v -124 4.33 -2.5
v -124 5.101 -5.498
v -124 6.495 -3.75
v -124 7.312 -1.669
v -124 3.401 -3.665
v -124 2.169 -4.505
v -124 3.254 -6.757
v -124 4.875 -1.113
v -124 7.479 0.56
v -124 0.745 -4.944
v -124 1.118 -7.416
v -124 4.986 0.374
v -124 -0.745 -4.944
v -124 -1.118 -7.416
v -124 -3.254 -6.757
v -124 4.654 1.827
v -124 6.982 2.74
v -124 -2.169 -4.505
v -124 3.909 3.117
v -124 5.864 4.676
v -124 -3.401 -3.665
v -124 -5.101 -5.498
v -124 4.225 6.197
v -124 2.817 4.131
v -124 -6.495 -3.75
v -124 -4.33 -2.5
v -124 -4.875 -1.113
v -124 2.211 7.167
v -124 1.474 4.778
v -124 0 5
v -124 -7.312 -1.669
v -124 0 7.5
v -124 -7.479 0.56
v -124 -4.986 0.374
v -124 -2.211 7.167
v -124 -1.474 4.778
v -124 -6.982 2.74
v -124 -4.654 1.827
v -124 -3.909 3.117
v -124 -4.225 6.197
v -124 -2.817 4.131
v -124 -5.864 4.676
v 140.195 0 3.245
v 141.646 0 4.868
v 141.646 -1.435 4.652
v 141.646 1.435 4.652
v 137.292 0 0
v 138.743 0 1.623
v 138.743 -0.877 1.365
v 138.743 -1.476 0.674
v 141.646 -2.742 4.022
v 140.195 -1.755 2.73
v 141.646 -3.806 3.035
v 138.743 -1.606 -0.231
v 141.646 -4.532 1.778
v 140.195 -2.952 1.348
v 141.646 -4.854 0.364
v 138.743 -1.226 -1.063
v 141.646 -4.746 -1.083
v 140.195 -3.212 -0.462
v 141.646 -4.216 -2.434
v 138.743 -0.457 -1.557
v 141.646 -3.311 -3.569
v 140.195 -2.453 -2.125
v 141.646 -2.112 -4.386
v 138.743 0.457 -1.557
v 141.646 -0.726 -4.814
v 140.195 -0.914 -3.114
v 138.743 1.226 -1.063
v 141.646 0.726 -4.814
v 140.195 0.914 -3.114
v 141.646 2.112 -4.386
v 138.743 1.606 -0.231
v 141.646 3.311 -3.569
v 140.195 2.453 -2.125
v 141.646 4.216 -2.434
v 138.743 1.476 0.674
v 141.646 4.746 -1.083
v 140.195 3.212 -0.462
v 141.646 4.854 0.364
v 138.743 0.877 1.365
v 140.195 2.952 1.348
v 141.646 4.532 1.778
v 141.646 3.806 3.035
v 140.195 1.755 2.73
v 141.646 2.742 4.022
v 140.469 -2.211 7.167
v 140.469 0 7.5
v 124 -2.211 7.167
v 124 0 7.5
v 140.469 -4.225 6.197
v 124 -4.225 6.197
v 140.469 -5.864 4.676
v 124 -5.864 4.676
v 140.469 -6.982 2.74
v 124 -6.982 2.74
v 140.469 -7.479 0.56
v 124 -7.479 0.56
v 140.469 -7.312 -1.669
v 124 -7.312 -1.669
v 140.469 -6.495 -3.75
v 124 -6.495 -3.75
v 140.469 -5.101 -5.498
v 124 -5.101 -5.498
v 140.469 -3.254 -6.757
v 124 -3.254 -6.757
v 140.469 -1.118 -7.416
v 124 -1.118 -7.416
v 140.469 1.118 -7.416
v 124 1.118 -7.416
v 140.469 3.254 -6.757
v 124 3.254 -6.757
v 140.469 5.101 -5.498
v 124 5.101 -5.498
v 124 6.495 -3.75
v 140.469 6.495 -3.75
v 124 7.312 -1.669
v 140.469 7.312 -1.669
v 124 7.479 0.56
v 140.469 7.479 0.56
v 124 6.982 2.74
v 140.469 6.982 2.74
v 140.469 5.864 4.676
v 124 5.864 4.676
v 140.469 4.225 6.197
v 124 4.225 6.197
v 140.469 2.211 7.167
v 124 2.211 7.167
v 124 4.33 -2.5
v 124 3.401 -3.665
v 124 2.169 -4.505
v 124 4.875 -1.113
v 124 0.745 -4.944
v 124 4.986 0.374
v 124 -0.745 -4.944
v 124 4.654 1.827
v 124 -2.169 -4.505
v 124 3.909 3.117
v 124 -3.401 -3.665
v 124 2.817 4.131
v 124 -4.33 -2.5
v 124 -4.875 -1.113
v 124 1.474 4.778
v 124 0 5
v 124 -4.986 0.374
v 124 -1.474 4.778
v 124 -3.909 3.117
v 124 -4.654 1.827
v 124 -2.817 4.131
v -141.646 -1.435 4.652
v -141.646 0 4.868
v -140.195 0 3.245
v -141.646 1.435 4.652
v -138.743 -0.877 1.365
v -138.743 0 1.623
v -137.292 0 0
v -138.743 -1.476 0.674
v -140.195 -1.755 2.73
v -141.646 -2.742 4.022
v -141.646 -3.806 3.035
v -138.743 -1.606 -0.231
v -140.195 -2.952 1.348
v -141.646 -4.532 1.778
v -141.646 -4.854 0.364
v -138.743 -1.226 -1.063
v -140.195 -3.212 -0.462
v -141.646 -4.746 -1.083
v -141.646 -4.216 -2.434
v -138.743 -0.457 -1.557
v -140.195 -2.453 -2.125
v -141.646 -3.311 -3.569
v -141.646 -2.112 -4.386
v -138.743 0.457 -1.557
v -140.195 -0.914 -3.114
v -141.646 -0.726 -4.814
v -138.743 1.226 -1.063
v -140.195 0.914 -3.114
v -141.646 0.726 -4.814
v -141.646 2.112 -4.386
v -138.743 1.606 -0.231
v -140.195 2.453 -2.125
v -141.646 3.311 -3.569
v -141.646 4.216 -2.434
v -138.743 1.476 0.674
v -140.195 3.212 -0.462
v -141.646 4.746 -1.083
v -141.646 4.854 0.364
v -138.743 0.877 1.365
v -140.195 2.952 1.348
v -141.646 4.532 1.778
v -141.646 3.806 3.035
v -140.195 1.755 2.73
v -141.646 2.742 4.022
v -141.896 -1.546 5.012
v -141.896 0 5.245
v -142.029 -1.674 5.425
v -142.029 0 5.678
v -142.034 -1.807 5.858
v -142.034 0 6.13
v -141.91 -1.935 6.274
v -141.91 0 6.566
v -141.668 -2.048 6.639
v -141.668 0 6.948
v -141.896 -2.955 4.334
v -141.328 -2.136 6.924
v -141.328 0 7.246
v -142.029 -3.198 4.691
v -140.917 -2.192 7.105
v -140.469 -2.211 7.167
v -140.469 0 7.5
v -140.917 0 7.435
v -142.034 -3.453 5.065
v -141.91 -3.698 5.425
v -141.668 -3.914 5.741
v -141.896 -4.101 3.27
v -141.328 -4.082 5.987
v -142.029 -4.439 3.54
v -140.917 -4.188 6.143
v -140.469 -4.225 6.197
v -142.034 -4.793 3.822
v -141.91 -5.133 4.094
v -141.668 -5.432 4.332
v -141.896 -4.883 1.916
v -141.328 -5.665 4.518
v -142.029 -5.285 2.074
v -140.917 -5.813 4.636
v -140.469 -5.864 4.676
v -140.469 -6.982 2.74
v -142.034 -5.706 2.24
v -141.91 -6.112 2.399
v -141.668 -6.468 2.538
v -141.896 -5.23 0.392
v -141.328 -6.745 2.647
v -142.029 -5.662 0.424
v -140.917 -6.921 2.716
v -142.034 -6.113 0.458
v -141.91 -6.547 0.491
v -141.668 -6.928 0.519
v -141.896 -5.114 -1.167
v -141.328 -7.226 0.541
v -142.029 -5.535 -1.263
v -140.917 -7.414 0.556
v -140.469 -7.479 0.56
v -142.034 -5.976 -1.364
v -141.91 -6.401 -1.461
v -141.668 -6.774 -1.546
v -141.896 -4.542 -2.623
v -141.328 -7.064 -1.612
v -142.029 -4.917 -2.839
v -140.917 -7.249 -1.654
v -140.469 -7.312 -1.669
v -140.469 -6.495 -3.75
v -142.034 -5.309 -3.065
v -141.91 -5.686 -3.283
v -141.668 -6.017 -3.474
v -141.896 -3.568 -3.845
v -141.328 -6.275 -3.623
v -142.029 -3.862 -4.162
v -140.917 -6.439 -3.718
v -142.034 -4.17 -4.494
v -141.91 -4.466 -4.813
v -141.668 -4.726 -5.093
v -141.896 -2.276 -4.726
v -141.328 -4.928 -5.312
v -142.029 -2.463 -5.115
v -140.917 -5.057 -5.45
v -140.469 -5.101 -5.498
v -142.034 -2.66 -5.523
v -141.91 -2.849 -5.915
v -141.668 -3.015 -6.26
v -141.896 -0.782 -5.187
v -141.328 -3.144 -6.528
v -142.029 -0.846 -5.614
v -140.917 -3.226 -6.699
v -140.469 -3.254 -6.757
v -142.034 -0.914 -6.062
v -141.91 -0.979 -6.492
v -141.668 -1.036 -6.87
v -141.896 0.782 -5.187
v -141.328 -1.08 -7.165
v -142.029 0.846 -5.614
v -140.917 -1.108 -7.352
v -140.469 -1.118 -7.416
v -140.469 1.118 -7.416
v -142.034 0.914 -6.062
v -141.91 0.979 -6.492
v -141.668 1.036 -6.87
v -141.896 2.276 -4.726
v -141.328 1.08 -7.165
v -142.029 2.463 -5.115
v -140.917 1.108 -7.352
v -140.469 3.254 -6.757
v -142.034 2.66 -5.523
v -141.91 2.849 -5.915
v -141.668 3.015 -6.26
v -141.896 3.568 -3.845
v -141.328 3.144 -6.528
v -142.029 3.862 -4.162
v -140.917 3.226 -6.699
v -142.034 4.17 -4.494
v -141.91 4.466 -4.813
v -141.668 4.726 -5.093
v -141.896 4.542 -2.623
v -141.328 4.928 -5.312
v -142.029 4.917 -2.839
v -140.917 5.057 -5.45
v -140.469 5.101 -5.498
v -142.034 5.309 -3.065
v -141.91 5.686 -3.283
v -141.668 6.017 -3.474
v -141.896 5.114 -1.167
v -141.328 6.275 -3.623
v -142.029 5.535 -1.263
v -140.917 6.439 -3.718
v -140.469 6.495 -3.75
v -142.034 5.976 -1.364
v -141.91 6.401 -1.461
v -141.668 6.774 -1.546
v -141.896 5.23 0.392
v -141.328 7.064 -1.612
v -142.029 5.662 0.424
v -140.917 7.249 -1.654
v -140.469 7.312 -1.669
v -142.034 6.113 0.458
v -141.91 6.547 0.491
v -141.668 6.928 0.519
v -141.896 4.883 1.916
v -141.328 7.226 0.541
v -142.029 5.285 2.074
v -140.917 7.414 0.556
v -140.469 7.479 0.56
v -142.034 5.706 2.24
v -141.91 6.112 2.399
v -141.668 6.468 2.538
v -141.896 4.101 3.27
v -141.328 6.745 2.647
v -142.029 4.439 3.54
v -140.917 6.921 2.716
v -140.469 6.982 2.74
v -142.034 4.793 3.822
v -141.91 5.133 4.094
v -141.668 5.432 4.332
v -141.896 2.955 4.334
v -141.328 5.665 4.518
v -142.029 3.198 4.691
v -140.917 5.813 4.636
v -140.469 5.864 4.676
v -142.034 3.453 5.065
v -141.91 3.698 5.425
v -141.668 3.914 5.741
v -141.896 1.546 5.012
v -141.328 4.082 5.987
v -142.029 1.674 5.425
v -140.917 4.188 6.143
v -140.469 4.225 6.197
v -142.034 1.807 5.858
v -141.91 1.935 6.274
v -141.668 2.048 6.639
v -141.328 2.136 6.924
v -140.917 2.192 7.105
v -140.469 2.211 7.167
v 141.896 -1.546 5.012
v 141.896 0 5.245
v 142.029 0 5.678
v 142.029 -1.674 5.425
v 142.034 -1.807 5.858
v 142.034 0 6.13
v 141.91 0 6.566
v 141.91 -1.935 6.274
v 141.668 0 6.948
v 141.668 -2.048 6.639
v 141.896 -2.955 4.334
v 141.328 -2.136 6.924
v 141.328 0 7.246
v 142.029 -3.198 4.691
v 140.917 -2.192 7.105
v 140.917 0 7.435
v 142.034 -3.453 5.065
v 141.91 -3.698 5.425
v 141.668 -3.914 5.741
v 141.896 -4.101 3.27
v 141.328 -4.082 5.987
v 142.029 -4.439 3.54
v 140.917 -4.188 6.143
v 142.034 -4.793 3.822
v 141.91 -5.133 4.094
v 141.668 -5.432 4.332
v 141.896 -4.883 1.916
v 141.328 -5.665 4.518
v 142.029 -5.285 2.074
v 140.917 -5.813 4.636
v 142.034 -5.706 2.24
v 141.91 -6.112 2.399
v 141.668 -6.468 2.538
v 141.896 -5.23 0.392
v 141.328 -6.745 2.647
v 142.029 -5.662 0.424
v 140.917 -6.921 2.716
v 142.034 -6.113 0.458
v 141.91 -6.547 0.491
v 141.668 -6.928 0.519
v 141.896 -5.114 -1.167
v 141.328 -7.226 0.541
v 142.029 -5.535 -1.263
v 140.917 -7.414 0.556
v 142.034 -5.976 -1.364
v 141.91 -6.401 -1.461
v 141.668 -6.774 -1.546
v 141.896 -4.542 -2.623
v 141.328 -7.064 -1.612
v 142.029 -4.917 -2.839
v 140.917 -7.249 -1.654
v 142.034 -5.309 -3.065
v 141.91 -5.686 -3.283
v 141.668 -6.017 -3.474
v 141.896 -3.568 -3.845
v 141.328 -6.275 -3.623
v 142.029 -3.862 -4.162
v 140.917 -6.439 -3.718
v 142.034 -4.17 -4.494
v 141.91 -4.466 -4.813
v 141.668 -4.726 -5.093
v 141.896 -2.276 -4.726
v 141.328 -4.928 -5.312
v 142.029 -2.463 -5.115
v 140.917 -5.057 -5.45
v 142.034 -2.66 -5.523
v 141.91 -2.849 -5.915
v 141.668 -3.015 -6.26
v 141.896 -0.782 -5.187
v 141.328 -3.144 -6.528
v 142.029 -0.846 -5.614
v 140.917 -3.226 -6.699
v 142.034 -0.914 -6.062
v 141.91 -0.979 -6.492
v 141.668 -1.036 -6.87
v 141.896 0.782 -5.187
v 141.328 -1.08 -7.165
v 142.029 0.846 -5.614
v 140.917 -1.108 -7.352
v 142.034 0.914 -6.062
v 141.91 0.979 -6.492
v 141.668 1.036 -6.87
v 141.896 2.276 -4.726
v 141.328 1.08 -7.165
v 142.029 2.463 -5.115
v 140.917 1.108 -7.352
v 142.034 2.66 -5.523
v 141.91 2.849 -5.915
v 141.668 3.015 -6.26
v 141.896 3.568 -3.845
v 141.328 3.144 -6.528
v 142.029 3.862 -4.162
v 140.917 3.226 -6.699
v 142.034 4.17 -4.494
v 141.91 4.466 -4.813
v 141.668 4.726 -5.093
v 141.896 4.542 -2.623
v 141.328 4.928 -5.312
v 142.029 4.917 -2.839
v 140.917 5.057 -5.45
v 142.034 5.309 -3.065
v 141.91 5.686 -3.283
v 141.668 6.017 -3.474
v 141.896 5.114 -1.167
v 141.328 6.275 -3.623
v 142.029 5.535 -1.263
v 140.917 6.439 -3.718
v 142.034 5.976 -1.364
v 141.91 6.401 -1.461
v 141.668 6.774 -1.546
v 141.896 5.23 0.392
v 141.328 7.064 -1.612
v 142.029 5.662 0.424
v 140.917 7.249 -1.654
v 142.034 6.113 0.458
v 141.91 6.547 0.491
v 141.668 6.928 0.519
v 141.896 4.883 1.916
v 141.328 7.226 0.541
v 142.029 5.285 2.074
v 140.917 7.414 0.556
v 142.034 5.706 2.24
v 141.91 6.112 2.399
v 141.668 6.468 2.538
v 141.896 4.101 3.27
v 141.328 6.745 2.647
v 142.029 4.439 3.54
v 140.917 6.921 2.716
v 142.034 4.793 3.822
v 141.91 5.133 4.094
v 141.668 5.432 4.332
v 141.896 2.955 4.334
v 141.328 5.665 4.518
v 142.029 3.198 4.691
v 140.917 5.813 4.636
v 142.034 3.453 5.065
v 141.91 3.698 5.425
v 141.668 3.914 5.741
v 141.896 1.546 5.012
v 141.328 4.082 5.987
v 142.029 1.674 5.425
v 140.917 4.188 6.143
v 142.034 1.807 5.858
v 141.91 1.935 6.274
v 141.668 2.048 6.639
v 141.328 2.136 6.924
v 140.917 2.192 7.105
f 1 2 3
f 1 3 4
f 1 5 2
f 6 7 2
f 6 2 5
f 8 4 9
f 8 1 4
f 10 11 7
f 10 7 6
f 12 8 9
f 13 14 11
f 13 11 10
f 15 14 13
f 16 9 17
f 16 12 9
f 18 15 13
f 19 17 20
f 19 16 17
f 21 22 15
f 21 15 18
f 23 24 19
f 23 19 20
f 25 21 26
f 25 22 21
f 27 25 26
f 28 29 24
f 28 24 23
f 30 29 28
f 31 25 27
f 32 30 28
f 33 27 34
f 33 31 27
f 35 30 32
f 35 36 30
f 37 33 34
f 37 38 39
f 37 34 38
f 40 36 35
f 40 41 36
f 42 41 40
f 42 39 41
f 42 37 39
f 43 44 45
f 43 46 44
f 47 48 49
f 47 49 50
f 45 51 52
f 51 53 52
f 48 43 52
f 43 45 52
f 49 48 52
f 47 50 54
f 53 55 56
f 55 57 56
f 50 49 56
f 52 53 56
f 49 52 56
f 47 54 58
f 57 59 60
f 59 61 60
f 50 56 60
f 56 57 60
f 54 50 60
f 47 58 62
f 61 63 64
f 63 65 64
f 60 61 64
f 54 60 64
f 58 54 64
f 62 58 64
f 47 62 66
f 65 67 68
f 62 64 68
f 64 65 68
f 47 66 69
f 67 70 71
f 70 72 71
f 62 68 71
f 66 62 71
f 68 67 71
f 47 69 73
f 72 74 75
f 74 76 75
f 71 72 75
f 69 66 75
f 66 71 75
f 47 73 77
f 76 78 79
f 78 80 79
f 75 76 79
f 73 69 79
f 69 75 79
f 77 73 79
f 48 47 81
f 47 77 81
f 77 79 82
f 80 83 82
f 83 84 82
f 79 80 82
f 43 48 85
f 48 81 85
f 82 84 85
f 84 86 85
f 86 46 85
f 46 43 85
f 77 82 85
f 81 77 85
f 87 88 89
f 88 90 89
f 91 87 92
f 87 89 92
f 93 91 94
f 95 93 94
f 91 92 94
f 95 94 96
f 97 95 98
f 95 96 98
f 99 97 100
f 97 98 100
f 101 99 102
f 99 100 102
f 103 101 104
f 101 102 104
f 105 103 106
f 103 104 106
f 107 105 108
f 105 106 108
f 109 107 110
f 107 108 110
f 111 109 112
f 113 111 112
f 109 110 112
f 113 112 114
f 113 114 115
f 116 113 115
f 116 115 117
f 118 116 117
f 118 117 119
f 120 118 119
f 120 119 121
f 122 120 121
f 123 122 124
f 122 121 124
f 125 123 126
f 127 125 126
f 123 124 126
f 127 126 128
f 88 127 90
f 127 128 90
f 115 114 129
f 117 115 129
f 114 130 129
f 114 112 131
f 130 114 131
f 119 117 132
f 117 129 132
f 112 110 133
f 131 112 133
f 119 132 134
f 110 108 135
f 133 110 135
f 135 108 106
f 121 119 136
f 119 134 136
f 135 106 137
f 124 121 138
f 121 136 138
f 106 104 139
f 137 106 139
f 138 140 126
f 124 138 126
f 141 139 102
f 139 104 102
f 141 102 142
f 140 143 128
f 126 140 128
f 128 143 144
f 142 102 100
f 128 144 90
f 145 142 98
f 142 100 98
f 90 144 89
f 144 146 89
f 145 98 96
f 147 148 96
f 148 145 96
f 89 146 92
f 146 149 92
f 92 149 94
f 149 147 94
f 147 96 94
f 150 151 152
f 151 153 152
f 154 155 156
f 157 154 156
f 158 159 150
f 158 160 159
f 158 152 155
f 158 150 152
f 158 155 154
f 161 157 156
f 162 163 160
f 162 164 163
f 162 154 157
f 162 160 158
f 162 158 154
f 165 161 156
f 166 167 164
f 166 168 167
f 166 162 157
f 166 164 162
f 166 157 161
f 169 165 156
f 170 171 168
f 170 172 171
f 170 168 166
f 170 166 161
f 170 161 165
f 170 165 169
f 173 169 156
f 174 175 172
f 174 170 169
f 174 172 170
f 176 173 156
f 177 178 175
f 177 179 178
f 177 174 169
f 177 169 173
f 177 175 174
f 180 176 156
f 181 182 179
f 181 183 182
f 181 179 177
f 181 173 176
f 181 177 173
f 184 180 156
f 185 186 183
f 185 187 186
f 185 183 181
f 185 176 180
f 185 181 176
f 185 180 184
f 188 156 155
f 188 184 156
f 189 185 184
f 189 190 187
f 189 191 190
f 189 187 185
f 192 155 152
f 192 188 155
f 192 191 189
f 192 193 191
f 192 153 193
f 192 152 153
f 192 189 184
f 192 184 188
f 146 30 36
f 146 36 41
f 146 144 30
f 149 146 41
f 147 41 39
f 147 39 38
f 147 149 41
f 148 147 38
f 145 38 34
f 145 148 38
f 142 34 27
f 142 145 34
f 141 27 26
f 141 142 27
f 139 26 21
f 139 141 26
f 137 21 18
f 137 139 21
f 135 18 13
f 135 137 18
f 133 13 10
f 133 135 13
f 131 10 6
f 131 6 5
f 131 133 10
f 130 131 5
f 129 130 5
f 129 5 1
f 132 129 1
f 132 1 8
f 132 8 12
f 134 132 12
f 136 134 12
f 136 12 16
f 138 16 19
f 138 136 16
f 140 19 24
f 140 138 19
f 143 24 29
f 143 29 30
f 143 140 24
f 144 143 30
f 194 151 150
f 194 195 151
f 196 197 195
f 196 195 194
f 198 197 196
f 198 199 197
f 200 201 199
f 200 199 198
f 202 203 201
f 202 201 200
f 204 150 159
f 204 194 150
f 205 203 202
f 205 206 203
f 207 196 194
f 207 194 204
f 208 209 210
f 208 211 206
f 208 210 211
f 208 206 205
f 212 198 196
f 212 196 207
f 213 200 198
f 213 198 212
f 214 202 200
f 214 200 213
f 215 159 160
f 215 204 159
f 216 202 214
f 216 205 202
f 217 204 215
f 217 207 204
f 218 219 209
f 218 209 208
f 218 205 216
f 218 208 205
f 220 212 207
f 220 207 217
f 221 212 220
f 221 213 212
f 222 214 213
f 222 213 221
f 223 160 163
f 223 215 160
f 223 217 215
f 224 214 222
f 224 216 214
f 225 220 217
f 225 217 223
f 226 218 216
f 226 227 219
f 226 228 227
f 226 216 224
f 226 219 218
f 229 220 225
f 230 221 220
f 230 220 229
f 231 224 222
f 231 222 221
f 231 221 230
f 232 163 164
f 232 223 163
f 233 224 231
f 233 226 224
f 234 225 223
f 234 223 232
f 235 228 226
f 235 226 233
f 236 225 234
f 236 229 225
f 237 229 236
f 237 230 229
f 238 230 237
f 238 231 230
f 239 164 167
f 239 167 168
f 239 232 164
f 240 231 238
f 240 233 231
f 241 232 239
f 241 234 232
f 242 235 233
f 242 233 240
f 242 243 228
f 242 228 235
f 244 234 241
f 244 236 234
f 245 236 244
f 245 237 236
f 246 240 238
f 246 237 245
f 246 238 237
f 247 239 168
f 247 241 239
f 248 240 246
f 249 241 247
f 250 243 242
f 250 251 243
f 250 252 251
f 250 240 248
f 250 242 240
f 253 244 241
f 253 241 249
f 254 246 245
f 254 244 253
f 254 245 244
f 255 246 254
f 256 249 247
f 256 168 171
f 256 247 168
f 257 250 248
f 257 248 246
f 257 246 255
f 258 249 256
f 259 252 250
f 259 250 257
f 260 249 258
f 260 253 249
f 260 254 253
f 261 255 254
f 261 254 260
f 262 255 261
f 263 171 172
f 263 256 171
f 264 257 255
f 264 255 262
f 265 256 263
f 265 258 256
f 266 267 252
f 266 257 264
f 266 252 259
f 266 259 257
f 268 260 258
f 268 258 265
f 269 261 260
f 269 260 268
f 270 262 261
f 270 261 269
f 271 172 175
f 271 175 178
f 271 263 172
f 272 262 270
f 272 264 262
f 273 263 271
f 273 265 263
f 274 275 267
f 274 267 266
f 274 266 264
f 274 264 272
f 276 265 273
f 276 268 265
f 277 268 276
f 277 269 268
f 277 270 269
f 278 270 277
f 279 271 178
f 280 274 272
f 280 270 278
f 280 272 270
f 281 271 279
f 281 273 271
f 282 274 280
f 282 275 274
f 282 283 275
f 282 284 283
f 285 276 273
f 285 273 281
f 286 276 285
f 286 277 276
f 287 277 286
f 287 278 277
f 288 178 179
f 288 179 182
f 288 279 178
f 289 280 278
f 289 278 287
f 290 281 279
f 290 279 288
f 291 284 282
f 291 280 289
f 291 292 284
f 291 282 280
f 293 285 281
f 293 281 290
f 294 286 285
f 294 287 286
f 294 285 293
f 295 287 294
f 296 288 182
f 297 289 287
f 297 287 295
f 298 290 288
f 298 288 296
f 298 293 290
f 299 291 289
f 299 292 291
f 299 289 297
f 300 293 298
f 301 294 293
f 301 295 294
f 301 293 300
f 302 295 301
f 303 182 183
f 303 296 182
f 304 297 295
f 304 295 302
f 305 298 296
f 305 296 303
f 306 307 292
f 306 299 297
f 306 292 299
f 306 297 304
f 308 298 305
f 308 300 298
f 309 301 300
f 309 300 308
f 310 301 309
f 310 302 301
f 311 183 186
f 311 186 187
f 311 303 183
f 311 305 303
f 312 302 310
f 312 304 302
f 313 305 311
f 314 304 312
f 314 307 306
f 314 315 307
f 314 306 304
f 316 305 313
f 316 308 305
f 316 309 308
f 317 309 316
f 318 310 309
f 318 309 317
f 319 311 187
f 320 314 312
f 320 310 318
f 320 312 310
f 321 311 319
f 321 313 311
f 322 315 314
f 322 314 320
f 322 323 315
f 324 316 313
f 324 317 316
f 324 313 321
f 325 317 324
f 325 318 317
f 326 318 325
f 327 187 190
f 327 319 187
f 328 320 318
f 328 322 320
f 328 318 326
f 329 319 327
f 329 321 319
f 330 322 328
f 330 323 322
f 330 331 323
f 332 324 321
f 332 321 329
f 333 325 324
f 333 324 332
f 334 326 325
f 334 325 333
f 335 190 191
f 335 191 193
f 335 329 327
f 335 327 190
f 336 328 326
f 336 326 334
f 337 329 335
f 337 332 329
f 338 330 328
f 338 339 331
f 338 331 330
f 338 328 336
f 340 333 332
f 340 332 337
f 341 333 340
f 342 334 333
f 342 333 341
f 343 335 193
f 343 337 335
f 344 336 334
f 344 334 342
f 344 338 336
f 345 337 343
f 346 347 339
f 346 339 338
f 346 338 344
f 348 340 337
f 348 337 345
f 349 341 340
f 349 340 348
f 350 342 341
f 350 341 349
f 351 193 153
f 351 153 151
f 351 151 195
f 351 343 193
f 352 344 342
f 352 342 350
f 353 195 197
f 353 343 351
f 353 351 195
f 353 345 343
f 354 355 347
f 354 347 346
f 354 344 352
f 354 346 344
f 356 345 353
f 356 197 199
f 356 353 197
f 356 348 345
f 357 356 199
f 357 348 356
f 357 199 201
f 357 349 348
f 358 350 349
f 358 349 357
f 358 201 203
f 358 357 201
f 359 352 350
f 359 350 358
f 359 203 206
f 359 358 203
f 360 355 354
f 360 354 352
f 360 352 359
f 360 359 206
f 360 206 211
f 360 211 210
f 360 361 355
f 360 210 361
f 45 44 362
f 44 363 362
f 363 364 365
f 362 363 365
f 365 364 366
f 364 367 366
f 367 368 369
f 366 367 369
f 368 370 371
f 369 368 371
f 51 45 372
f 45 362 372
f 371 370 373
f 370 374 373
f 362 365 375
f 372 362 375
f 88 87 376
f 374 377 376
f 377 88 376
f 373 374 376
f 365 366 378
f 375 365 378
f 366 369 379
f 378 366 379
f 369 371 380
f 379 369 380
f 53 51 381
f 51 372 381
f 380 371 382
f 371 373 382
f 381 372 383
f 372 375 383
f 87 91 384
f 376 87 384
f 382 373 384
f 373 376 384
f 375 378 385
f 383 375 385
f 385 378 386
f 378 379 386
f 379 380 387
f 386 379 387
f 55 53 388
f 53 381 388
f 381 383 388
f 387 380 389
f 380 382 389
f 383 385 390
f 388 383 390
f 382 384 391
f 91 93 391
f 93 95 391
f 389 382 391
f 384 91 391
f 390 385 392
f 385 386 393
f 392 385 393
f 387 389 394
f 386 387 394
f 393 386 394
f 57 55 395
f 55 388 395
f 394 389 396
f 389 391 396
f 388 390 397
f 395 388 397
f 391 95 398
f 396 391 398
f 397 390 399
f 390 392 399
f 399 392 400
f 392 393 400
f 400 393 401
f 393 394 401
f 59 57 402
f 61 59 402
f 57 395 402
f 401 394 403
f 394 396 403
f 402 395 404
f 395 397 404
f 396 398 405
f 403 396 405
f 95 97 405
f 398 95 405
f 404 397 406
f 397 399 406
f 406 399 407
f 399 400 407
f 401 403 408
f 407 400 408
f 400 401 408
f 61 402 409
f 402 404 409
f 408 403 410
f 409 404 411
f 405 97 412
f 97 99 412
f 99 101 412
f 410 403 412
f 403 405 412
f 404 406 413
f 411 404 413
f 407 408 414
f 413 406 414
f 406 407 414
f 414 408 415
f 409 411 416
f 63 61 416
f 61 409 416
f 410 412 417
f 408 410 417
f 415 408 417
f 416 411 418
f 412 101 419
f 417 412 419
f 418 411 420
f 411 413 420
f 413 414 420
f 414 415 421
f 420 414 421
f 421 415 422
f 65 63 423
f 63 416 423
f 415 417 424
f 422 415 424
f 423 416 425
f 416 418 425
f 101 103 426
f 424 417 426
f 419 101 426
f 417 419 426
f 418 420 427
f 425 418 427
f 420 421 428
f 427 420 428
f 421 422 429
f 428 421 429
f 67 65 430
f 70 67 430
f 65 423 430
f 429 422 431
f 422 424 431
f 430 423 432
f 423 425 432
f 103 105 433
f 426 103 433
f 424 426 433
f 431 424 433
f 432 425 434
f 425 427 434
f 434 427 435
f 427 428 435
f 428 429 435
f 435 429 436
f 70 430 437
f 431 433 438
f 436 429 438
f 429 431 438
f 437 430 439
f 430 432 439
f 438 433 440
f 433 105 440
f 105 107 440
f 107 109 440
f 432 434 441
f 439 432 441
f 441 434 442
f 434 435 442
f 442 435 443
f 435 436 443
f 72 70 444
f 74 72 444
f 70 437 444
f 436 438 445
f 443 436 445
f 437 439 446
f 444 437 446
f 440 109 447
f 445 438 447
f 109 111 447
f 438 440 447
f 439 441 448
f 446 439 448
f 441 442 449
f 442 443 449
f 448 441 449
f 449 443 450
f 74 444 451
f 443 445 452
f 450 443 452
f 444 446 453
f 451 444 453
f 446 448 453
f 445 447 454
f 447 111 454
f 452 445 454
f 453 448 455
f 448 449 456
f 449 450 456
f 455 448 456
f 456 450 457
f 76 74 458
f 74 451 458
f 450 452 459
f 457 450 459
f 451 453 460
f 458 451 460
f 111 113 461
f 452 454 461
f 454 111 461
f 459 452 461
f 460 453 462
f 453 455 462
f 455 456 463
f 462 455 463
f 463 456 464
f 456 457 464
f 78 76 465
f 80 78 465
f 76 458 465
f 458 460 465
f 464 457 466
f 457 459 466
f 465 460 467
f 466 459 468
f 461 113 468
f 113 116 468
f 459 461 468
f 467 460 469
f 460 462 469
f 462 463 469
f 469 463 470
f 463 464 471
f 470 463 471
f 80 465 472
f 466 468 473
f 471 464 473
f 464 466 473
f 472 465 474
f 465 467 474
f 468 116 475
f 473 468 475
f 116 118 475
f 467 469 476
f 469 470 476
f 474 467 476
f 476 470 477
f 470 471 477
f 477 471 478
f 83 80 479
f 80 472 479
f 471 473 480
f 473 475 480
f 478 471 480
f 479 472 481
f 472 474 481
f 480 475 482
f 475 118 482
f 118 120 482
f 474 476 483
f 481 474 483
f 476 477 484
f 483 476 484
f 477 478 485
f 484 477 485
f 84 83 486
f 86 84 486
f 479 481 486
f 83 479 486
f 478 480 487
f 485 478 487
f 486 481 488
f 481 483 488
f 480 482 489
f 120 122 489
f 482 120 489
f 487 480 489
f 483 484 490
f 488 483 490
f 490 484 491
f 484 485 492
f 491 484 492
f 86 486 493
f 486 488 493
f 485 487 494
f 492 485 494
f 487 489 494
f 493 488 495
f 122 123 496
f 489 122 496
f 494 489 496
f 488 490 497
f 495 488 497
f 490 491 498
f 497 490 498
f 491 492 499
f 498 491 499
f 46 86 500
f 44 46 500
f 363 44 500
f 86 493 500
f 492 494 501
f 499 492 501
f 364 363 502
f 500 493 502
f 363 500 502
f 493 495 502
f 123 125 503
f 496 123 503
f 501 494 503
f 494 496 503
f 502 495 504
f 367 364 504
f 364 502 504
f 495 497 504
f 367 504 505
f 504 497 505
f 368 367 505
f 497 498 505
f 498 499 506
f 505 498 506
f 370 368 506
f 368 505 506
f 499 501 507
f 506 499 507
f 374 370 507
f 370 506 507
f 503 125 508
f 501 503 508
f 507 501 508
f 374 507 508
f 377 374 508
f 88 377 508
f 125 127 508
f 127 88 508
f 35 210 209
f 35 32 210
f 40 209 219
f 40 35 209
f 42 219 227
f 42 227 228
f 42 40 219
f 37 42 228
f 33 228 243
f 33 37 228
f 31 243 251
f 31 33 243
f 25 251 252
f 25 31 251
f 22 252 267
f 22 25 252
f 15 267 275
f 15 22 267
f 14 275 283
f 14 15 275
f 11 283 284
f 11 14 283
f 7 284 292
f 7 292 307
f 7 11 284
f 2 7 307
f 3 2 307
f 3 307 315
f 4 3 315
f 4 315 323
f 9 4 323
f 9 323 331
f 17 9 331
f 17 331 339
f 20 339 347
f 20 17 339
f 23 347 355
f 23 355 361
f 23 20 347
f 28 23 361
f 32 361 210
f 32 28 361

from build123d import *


with BuildPart() as part:
    # Sketch1 → Revolve1 (revolve)
    with BuildSketch(Plane.XY, mode=Mode.PRIVATE) as revolve1_sk:
        with BuildLine():
            Line((137.291796068, 0), (141.645898034, 4.868033989))
            ThreePointArc((141.645898034, 4.868033989), (141.910434206, 6.565517768), (140.468847051, 7.5))
            Line((140.468847051, 7.5), (124, 7.5))
            Line((124, 7.5), (124, 5))
            Line((124, 5), (0, 5))
            Line((0, 5), (0, 0))
            Line((0, 0), (124, 0))
            Line((124, 0), (137.291796068, 0))
        make_face()
    revolve1 = revolve(revolve1_sk.sketch.rotate(Axis((0, 0, 0), (1, 0, 0)), 90), axis=Axis((0, 0, 0), (1, 0, 0)))

    # Mirror1: Revolve1 across plane
    add(revolve1.mirror(Plane.ZY))


solid = part.part
